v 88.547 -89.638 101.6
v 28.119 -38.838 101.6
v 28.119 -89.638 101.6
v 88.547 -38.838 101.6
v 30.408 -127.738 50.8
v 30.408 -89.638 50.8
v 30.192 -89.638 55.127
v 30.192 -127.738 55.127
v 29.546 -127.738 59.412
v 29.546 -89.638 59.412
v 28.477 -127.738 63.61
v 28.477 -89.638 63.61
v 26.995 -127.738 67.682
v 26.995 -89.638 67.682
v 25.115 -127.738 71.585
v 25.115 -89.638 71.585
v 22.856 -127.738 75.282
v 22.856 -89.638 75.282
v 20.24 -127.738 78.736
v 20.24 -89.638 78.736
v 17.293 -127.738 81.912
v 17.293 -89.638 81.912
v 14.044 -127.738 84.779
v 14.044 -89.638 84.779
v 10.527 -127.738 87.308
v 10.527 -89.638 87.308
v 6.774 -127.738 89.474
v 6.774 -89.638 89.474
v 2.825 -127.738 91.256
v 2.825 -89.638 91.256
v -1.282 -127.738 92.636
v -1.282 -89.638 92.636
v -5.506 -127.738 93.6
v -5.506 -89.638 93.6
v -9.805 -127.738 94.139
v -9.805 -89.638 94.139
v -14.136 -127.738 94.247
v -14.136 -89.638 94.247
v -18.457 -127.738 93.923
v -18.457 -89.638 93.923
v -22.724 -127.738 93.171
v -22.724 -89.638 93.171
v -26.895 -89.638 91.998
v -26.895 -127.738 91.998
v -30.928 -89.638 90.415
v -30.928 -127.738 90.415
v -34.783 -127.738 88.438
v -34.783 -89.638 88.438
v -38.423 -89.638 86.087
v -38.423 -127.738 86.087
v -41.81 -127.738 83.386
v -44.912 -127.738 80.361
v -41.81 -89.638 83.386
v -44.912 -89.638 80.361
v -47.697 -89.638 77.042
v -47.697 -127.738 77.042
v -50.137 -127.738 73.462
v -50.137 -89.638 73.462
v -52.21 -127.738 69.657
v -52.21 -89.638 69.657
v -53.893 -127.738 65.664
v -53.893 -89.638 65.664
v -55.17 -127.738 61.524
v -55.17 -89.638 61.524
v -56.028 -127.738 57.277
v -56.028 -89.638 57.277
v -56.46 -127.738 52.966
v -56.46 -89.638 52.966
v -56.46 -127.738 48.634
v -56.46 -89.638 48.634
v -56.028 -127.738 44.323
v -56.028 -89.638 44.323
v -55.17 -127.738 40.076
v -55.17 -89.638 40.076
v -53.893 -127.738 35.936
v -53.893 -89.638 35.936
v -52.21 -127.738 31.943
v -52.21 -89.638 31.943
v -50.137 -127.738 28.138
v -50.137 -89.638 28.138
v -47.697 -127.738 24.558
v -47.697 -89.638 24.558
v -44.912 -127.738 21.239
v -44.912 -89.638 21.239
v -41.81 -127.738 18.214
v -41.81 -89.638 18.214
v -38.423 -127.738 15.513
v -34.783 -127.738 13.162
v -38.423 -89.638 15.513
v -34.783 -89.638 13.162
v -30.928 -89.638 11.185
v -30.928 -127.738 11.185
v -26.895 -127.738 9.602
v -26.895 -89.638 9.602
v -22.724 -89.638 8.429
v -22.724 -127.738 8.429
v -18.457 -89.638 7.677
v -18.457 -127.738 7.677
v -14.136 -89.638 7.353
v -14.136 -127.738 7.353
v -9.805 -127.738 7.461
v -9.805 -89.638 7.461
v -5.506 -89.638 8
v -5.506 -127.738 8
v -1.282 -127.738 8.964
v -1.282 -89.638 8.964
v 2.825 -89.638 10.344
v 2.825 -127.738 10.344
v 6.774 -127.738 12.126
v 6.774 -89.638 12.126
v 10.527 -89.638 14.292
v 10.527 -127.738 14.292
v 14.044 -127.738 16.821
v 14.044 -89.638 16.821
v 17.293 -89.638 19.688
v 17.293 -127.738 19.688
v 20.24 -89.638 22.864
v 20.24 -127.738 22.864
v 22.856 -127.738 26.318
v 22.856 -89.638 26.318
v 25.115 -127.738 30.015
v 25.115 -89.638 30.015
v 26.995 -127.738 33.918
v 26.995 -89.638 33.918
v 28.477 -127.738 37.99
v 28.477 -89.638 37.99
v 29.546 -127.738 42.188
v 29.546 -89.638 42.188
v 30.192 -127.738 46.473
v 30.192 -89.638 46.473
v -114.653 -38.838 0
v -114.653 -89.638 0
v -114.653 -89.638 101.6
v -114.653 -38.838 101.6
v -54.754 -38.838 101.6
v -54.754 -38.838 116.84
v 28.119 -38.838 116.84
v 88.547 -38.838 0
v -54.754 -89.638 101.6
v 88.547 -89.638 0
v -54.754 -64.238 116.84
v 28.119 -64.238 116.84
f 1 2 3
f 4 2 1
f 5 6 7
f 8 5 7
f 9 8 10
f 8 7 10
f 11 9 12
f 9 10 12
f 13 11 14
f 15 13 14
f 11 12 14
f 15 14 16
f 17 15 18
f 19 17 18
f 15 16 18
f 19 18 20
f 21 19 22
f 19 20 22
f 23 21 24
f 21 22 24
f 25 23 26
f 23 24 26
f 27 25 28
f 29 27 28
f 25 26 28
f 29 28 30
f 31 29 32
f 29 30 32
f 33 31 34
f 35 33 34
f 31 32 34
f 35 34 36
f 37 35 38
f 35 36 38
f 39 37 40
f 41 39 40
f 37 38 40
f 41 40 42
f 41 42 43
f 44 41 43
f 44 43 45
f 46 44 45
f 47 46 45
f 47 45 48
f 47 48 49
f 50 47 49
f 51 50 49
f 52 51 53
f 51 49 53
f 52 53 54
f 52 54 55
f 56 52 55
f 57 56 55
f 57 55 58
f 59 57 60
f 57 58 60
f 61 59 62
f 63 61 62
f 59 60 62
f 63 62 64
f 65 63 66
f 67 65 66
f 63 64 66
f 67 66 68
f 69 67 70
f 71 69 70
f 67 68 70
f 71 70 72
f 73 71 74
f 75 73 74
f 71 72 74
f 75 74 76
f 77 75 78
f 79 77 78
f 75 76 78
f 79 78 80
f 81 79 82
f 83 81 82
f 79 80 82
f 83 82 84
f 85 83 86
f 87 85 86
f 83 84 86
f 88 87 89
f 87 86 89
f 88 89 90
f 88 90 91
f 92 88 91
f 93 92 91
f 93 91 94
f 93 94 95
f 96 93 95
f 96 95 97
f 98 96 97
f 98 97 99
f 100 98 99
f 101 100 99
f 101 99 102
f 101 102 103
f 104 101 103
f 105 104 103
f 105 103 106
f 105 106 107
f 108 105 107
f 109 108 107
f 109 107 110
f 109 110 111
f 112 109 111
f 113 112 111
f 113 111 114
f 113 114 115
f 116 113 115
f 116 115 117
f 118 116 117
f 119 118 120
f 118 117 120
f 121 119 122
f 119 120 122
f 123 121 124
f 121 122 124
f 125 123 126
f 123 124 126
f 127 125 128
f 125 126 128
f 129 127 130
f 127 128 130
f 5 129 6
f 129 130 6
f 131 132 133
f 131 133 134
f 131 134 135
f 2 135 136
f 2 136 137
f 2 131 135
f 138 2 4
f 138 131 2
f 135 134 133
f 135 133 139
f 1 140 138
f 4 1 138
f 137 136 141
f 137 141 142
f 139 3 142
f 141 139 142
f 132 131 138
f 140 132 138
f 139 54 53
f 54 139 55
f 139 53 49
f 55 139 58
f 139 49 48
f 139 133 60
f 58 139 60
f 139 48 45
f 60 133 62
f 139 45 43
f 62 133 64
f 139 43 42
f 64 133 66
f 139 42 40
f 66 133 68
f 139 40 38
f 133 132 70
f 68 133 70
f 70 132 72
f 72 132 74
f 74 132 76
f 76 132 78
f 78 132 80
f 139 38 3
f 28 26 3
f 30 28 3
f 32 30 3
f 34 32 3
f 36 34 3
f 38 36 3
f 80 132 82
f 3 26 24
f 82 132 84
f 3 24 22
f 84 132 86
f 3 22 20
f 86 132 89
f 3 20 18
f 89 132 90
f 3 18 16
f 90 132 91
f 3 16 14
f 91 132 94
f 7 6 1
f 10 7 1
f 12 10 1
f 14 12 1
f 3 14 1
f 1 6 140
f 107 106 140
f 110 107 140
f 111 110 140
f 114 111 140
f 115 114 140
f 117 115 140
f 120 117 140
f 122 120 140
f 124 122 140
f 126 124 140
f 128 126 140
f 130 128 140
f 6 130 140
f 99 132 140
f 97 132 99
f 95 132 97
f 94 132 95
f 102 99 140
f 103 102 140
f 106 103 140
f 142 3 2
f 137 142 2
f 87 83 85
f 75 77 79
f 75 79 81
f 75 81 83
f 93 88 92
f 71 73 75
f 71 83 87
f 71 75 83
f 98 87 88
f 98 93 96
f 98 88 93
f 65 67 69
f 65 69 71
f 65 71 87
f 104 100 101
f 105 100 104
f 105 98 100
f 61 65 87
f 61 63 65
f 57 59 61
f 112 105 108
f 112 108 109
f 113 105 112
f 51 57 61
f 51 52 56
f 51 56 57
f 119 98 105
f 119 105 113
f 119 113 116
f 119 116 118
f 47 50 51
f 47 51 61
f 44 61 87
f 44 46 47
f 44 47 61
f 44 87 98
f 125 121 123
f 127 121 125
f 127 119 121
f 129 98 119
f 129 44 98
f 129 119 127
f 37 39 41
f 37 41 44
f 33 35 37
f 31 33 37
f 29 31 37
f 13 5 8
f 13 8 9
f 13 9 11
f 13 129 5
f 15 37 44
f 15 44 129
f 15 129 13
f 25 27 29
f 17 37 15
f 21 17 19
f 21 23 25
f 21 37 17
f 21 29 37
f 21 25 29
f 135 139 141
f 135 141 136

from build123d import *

# Parameters (mm, degrees)
F0_W     = 203.2
F0_H     = 50.8
F1_DEPTH = 101.6
F2_R     = 43.460666
F3_DEPTH = 38.1
F4_W     = 82.872769
F4_H     = 50.8
F5_DEPTH = 15.24
F7_DEPTH = 101.6


with BuildPart() as f1:
    # F0 (on Top) → F1 (new body)
    with BuildSketch(Plane.XY):
        with Locations((-13.052889, -64.237624)):
            Rectangle(F0_W, F0_H)
    extrude(amount=F1_DEPTH)

    # F2 (on face) → F3 (join)
    with BuildSketch(Plane.XZ.offset(89.637624)):
        with Locations((-13.052889, 50.8)):
            Circle(F2_R)
    extrude(amount=F3_DEPTH)

    # F4 (on face) → F5 (join)
    with BuildSketch(Plane.XY.offset(101.6)):
        with Locations((-13.317311, -64.237624)):
            Rectangle(F4_W, F4_H)
    extrude(amount=F5_DEPTH)

    # F6 (on face) → F7 (cut)
    with BuildSketch(Plane.YZ.offset(28.119074)):
        Polygon((-89.637624, 116.84), (-89.637624, 101.6), (-64.237624, 116.84), align=None)
    extrude(amount=-F7_DEPTH, mode=Mode.SUBTRACT)


solid = f1.part
